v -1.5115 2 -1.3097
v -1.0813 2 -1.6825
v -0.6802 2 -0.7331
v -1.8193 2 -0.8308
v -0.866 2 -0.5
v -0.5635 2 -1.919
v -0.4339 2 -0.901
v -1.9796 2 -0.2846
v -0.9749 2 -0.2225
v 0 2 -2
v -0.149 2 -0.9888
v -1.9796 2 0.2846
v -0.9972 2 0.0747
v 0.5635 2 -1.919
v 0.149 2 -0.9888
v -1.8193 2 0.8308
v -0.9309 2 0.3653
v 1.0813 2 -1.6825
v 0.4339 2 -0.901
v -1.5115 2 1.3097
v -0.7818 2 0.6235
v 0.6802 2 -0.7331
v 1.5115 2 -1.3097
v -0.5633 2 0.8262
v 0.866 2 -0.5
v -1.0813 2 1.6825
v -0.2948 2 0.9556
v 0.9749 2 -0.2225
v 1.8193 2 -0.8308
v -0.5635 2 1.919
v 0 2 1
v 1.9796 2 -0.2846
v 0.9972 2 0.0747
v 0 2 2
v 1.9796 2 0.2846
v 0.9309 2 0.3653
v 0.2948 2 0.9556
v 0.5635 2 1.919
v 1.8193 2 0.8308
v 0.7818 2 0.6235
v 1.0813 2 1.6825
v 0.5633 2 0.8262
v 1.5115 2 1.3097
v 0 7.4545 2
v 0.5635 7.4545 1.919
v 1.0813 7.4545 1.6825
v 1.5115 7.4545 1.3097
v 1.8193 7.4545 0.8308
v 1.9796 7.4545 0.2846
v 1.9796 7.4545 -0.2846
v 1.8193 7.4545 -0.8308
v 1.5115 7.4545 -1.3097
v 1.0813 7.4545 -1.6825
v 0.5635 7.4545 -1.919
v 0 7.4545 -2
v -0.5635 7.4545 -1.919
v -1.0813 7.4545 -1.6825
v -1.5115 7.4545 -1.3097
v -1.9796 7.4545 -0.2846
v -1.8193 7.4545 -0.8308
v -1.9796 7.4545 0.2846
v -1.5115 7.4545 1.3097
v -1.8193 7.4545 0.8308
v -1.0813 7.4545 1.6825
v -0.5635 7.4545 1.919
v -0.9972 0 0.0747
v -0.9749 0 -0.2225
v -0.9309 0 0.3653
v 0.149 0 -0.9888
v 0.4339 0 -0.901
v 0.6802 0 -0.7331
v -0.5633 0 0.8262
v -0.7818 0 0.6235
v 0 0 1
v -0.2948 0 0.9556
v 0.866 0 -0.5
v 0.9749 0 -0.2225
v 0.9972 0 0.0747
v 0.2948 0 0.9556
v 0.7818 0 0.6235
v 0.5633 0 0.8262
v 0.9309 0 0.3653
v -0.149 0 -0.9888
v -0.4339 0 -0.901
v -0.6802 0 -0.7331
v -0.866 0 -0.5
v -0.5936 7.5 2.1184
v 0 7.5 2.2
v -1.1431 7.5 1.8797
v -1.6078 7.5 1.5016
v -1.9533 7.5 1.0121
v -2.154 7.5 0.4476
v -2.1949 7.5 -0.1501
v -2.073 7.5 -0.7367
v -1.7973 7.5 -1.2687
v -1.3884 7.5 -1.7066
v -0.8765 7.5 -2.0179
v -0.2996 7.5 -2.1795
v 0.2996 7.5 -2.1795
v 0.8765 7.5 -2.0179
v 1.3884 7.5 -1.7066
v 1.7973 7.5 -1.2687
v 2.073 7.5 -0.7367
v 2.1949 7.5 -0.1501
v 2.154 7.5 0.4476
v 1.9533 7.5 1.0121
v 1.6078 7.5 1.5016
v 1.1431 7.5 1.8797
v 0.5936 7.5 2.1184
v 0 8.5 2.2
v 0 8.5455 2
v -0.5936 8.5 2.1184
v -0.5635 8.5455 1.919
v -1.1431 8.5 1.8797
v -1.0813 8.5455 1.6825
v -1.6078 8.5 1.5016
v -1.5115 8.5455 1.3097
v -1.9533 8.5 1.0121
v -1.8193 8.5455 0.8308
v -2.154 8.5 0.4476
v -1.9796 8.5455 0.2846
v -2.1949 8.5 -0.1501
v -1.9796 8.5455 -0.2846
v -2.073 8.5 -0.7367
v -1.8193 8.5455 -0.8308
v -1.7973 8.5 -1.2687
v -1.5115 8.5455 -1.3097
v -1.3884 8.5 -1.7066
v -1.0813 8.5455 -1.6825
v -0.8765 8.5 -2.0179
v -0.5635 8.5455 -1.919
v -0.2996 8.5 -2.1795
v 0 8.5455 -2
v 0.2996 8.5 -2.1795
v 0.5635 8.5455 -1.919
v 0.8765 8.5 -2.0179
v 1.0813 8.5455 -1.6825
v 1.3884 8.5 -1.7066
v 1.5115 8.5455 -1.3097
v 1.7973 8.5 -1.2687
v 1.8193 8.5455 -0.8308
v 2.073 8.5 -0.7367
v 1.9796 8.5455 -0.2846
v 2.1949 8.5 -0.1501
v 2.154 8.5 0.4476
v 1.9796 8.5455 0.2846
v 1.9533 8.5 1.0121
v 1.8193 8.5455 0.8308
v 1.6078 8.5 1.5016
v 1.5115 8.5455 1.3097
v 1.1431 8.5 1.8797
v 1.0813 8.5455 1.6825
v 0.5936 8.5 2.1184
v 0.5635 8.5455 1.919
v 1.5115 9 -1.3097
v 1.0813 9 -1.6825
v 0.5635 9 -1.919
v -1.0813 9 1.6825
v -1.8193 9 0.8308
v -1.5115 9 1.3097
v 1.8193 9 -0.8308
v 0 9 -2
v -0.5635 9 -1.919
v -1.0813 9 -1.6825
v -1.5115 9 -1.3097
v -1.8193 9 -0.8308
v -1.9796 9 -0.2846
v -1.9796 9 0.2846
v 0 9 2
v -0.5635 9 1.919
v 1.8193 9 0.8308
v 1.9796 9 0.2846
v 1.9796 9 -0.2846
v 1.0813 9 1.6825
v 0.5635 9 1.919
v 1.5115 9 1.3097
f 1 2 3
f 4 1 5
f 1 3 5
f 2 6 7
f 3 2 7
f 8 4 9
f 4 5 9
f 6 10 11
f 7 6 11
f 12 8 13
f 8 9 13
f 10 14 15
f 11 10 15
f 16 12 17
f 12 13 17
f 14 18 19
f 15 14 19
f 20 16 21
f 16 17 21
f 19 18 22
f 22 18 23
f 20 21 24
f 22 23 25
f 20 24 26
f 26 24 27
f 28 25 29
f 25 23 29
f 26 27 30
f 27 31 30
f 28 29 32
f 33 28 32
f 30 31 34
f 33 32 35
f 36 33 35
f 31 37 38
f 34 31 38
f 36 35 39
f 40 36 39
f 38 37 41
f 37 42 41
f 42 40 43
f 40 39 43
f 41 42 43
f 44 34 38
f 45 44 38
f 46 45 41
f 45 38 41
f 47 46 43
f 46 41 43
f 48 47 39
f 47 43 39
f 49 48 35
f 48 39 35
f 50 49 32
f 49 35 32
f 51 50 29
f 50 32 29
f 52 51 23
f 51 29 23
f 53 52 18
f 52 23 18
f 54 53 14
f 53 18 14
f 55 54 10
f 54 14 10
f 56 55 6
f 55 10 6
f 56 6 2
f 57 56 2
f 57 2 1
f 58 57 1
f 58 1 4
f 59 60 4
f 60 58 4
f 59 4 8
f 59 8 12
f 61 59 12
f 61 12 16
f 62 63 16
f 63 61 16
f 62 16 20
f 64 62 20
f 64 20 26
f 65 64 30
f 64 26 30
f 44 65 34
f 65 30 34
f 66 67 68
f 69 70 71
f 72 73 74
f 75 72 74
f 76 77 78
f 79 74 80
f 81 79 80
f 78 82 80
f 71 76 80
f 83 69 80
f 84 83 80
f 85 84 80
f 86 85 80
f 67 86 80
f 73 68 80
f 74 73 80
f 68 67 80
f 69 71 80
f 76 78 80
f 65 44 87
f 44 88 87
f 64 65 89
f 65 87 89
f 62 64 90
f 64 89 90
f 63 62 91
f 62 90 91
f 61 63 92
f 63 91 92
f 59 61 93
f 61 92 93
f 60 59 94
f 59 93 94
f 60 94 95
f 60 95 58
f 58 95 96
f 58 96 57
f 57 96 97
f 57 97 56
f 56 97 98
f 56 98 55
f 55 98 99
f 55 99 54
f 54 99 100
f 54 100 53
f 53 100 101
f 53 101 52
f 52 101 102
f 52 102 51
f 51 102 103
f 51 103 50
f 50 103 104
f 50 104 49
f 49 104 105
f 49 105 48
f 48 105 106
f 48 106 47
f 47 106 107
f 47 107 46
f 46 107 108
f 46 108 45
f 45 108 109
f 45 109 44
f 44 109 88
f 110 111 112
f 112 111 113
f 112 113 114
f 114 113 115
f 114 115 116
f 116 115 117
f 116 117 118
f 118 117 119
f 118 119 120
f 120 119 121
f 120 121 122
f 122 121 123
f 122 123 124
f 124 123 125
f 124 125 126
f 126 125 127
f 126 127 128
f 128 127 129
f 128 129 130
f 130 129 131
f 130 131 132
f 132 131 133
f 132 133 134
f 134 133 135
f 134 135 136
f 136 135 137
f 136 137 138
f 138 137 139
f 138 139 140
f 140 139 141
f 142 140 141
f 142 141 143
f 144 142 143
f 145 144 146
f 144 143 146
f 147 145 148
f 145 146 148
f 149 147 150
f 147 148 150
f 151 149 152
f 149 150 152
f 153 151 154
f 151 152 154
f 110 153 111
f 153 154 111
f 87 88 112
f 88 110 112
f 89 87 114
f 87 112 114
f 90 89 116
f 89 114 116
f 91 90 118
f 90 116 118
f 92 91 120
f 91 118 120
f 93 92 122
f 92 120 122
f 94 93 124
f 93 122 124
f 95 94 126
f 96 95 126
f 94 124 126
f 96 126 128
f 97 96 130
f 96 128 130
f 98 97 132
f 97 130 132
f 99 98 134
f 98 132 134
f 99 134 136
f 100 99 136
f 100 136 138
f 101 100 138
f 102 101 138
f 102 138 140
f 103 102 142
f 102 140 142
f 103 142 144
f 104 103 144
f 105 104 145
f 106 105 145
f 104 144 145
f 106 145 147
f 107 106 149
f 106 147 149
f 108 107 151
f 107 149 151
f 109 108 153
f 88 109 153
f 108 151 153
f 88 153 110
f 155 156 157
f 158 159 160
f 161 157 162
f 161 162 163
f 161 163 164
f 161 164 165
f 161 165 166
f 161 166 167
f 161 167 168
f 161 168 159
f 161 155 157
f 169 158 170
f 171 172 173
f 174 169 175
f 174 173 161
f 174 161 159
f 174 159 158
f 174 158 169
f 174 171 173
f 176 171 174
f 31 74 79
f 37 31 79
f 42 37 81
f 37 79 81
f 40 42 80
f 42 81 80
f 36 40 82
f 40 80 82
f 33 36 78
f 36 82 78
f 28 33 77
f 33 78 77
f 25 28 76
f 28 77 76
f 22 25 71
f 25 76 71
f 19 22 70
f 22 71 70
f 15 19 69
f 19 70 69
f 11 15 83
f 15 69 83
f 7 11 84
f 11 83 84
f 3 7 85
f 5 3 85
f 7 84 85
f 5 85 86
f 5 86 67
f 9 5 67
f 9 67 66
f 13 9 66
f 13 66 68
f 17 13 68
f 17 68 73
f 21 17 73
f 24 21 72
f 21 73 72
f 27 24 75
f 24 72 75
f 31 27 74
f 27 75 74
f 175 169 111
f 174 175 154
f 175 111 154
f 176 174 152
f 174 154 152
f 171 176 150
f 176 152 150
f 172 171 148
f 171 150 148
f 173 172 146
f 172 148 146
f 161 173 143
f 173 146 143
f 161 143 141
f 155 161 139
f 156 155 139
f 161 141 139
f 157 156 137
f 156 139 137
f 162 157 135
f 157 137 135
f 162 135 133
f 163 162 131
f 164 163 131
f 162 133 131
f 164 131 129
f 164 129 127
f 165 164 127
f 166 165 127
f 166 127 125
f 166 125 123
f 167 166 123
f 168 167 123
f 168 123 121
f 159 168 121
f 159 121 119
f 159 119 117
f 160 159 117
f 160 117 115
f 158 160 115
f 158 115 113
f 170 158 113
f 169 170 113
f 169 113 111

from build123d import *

# Parameters (mm, degrees)
SKETCH_1_R      = 1
EXTRUDE_1_DEPTH = 2
SKETCH_2_R      = 2
EXTRUDE_2_DEPTH = 7


with BuildPart() as part:
    # 草图1 → 凸台-拉伸1 (new body)
    with BuildSketch(Plane(origin=(0, 0, 0), x_dir=(1, 0, 0), z_dir=(0, 1, 0))):
        with Locations(Location((0, 0, 0), (0, 0, 270))):
            Circle(SKETCH_1_R)
    extrude(amount=EXTRUDE_1_DEPTH)

    # 草图2 → 凸台-拉伸2 (add)
    with BuildSketch(Plane(origin=(0, 2, 0), x_dir=(1, 0, 0), z_dir=(0, 1, 0))):
        with Locations(Location((0, 0, 0), (0, 0, 270))):
            Circle(SKETCH_2_R)
    extrude(amount=EXTRUDE_2_DEPTH)

    # 草图3 → 旋转1 (revolve)
    with BuildSketch(Plane.XY, mode=Mode.PRIVATE) as revolve_1_sk:
        Polygon((0, 9), (0, 7), (2.2, 7.5), (2.2, 8.5), align=None)
    revolve(revolve_1_sk.sketch.rotate(Axis((0, 9, 0), (0, -1, 0)), 90), axis=Axis((0, 9, 0), (0, -1, 0)))


solid = part.part
